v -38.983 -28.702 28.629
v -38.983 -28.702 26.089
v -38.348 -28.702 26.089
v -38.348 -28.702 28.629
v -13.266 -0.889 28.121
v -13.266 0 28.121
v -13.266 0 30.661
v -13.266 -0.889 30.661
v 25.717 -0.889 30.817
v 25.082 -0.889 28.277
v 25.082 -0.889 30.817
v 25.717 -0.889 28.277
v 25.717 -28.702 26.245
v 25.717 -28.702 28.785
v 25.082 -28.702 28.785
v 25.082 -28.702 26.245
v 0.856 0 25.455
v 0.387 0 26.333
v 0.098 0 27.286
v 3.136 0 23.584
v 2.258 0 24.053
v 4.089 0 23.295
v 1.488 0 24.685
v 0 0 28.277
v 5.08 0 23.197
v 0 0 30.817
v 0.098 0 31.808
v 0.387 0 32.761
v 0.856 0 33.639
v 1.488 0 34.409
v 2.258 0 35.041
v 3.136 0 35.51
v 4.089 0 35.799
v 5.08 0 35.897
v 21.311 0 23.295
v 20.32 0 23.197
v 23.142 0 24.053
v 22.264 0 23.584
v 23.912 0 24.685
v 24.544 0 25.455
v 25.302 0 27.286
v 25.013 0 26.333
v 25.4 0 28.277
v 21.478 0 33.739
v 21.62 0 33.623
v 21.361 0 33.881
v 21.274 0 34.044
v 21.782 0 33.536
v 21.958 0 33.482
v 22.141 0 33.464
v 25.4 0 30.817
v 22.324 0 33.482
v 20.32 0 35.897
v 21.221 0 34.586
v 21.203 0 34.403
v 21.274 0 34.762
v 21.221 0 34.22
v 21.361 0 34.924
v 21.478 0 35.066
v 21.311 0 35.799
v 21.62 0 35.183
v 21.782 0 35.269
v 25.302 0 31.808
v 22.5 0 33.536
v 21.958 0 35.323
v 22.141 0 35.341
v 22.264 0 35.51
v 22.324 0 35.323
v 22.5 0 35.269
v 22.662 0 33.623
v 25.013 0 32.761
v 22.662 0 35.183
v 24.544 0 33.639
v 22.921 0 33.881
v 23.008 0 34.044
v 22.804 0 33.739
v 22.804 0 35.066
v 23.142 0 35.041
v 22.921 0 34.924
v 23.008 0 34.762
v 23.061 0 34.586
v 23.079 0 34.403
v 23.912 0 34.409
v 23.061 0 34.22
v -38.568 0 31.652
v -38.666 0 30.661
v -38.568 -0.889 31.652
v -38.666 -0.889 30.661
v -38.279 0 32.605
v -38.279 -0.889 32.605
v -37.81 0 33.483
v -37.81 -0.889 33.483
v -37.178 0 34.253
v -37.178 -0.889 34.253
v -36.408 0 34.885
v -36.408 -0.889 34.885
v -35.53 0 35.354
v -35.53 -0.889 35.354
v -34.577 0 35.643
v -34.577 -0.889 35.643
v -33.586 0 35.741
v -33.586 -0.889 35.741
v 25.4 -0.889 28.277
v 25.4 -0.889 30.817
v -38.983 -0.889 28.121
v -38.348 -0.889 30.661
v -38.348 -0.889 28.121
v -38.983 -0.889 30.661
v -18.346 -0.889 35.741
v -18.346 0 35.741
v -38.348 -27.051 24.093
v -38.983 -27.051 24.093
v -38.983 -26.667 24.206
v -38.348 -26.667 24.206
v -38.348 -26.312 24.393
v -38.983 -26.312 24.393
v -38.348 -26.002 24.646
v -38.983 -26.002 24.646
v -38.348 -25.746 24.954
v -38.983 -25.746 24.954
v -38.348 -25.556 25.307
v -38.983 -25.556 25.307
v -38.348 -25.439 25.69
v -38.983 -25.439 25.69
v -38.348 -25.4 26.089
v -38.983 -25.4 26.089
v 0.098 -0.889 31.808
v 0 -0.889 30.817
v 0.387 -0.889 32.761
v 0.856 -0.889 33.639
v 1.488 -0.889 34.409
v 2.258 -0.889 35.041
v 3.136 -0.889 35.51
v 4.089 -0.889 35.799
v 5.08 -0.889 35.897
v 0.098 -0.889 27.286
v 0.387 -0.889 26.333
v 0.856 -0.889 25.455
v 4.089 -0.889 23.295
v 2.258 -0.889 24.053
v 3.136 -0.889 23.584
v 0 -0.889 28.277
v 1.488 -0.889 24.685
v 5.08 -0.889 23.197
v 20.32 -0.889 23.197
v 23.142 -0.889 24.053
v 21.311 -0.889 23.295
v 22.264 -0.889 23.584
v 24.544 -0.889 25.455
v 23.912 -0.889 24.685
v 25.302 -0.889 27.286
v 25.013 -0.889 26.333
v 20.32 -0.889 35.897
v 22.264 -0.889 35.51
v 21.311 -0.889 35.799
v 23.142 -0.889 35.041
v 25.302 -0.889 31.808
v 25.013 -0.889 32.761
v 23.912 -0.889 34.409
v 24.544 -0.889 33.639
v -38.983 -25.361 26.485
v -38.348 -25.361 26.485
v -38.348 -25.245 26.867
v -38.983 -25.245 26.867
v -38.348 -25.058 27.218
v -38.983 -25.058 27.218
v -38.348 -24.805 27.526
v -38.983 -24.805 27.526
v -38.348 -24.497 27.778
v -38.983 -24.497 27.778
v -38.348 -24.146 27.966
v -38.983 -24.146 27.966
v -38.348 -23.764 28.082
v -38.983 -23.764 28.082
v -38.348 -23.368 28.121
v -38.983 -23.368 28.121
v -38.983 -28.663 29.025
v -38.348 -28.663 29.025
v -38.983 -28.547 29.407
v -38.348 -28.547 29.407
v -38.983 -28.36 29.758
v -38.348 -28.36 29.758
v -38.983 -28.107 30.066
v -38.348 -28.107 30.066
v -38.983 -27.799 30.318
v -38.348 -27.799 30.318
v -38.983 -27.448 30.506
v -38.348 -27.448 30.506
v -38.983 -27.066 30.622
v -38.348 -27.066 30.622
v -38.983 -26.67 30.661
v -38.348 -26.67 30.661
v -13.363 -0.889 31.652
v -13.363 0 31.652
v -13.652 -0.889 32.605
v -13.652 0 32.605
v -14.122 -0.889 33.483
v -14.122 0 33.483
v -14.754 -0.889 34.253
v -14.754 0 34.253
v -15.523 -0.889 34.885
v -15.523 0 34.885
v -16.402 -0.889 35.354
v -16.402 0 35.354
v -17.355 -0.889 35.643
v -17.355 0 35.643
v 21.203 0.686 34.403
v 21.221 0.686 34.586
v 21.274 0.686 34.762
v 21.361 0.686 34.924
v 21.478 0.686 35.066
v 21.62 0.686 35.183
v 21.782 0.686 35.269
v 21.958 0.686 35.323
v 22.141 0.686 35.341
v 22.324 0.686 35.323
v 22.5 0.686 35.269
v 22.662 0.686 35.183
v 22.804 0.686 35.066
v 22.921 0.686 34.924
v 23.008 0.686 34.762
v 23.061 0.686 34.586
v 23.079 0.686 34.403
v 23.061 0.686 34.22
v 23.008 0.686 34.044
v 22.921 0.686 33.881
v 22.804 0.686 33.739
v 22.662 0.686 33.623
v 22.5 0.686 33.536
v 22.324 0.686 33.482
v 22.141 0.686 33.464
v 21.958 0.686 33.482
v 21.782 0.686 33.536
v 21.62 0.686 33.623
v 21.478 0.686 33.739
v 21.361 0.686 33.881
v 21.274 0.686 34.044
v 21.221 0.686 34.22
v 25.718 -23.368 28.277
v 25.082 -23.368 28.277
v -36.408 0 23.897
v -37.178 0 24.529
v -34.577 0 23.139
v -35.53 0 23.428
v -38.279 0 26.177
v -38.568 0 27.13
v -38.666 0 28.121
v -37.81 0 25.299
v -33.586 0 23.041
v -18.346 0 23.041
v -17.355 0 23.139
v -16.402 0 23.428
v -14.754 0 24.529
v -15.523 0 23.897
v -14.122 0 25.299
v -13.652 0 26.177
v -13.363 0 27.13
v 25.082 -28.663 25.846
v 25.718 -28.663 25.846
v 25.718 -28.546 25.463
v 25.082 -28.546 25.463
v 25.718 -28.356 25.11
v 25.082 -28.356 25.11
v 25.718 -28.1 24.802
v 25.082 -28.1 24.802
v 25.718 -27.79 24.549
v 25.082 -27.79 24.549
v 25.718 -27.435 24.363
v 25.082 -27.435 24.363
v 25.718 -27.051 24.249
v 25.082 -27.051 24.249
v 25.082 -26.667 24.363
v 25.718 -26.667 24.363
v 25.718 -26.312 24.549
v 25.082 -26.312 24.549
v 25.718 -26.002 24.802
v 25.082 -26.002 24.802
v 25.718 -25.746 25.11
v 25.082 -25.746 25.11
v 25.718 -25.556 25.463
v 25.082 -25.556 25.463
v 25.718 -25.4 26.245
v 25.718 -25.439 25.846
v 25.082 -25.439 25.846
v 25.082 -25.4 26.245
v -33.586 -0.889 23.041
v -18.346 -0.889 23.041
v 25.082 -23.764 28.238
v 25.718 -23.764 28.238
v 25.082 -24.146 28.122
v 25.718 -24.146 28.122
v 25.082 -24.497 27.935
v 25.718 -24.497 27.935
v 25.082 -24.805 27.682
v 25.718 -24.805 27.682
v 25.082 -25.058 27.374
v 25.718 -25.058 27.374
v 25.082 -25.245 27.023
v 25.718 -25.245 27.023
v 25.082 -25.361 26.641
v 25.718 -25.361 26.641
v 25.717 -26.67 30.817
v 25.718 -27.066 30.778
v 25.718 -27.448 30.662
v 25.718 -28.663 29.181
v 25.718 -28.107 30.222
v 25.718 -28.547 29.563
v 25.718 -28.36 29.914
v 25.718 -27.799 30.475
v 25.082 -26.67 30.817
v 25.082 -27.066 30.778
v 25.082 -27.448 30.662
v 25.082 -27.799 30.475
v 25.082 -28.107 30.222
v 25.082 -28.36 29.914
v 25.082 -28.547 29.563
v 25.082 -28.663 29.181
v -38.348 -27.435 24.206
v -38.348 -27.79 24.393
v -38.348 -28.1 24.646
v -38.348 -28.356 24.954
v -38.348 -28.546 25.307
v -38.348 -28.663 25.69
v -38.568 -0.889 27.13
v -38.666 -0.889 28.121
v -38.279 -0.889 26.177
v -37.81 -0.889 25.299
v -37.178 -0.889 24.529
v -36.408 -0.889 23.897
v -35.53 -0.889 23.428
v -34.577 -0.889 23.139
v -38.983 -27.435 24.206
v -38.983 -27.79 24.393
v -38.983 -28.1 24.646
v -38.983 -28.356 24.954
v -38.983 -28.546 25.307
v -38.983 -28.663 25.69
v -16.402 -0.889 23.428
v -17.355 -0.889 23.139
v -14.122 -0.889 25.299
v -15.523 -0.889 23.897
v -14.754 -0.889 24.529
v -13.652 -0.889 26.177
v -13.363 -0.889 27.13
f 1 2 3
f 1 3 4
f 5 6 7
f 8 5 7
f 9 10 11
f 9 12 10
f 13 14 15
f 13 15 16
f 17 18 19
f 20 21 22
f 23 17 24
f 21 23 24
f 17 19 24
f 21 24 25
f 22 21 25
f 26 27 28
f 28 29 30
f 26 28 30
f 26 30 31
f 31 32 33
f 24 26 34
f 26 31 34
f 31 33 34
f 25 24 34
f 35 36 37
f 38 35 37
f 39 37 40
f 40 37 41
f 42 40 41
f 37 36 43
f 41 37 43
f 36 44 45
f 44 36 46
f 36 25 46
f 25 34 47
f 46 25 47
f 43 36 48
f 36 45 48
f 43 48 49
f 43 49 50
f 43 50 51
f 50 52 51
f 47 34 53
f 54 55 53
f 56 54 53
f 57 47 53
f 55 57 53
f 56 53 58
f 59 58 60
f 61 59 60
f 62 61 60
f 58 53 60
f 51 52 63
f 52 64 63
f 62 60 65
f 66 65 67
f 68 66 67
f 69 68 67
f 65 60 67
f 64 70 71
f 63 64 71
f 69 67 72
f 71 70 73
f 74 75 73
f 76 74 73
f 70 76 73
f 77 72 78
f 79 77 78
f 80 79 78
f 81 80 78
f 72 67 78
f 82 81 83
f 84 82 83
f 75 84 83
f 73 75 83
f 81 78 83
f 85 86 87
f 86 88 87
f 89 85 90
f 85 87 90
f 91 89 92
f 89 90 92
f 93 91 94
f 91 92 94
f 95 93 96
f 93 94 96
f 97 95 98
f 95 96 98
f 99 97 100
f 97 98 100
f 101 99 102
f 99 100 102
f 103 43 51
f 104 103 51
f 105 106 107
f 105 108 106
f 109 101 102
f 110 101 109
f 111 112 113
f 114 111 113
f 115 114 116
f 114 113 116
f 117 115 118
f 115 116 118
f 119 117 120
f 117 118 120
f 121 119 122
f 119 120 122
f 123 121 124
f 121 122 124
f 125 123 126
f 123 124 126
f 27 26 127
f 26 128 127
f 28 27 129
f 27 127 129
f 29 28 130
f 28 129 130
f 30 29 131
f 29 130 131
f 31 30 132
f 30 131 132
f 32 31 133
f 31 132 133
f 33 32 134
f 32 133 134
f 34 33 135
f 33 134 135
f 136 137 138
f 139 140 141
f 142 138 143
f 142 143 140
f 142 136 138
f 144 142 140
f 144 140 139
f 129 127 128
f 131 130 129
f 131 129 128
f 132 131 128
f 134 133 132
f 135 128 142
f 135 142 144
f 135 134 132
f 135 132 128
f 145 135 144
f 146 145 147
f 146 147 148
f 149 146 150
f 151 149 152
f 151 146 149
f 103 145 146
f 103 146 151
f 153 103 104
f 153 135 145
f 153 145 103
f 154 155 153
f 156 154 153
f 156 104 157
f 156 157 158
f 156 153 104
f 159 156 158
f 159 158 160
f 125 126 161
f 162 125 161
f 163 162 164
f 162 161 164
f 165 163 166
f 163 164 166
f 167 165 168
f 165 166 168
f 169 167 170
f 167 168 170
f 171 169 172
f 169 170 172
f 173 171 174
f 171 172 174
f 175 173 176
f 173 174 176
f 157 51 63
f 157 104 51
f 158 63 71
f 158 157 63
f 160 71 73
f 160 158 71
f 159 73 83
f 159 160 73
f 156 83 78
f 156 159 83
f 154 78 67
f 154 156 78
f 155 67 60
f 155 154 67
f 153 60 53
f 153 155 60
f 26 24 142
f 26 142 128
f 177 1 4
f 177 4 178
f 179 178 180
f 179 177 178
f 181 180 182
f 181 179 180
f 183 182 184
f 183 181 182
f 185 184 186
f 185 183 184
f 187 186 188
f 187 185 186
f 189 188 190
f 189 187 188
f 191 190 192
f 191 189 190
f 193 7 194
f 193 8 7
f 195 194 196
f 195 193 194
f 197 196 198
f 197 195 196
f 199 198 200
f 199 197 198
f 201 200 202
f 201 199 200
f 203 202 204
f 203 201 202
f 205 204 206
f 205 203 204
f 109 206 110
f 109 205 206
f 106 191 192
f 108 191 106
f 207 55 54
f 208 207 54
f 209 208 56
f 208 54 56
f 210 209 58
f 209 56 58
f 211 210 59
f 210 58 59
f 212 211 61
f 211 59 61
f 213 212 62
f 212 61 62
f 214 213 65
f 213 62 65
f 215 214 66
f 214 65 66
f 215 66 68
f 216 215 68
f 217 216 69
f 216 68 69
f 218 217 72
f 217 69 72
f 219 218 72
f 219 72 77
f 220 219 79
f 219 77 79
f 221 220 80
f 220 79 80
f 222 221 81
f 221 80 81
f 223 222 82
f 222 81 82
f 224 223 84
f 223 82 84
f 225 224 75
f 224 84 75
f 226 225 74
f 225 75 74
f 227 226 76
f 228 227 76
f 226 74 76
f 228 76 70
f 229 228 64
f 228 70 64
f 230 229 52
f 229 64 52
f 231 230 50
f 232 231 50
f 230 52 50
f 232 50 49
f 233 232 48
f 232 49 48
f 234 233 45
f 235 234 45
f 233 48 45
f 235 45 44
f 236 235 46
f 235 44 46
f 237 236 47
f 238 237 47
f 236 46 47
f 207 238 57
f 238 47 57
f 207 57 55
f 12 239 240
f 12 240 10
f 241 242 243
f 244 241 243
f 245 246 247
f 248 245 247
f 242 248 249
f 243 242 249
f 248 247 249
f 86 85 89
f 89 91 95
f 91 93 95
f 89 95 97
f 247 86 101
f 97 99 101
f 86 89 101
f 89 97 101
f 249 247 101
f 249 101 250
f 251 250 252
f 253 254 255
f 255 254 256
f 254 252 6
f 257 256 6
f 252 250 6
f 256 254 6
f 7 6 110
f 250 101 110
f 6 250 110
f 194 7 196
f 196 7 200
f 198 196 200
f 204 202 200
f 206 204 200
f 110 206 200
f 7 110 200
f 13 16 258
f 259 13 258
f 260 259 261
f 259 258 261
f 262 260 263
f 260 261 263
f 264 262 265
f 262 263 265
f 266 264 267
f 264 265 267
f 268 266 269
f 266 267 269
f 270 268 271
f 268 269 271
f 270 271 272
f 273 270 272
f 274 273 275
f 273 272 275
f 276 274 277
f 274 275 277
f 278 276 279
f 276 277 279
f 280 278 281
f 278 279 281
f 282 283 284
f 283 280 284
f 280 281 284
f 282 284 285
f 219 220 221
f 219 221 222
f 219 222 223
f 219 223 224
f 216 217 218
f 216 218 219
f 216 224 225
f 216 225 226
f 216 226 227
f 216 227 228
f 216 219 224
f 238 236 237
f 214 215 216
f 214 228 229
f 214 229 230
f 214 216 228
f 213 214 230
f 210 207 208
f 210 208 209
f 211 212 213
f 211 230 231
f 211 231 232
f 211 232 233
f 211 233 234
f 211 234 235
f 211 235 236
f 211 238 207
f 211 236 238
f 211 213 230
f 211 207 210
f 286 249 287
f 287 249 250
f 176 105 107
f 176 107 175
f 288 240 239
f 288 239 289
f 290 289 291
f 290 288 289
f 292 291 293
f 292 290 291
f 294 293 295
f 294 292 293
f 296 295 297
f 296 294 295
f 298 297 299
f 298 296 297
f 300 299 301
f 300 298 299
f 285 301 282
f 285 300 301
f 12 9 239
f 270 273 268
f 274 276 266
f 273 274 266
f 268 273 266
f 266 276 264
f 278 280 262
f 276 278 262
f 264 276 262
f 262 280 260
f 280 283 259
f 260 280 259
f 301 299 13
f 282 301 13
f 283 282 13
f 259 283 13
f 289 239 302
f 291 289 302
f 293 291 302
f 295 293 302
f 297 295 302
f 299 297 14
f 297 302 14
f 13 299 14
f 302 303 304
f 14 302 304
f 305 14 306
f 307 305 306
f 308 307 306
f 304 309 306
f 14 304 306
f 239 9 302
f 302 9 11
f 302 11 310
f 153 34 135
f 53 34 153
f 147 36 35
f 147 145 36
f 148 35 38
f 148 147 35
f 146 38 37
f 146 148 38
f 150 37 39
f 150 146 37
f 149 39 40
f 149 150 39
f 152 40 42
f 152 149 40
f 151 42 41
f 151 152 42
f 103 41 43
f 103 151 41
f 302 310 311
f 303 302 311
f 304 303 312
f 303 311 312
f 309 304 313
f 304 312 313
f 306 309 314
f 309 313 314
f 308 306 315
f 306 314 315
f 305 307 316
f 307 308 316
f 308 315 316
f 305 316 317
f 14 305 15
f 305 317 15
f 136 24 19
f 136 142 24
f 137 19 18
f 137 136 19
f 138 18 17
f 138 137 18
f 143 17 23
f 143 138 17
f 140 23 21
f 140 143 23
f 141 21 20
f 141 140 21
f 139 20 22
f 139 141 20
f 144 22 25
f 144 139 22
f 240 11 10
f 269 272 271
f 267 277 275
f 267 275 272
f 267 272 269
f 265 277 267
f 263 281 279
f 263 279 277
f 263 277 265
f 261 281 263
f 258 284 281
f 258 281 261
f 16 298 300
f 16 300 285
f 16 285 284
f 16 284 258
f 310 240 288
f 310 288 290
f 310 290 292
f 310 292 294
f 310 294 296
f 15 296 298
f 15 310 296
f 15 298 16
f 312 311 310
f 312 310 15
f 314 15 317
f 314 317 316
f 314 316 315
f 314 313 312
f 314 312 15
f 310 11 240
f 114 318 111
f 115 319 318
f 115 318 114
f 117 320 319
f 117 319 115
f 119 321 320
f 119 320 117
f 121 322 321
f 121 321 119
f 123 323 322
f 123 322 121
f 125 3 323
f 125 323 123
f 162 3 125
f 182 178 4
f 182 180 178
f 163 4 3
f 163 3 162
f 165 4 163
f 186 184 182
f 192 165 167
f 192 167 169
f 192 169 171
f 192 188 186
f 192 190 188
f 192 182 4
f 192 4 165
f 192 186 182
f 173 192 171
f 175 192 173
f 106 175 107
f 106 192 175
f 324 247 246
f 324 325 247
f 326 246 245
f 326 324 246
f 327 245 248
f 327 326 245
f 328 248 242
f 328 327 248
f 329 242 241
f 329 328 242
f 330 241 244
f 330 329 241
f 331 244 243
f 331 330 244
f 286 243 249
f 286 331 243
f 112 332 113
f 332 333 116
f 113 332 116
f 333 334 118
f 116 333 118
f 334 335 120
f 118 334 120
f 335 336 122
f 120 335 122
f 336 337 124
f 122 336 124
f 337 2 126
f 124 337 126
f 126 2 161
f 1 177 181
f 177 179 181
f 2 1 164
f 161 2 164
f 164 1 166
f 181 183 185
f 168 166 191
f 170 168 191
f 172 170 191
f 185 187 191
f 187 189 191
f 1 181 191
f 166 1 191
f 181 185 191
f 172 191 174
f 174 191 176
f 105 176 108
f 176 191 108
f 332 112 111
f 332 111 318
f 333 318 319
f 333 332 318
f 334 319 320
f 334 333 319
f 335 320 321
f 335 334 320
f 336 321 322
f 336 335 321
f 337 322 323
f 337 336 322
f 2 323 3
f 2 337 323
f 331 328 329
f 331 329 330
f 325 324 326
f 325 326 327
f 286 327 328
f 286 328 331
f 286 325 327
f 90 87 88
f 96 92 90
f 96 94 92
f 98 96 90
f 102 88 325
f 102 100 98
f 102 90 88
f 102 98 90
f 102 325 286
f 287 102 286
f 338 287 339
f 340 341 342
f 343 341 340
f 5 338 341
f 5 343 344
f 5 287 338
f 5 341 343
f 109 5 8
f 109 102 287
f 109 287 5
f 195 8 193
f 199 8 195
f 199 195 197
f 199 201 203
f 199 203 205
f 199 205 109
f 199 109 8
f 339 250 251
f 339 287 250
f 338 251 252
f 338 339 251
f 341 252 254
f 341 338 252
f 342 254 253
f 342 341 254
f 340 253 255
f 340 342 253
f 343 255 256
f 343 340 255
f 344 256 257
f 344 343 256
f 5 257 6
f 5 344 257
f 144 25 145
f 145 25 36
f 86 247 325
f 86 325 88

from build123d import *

# Parameters (mm, degrees)
F0_W        = 25.4
F0_H        = 12.7
F1_DEPTH    = 0.889
F2_R        = 5.08
F2_2_R      = 5.08
F5_DEPTH    = 0.3175
F6_T1_DEPTH = 0.635
F6_T3_DEPTH = 10.795
F8_DEPTH    = 0.3175
F9_T1_DEPTH = 0.635
F9_T3_DEPTH = 10.795
F10_R       = 0.9381315748
F10_R_2     = 0.643552657
F10_R_3     = 0.4022191612
F11_DEPTH   = 0.6858


# Not quite as in the source:
# - a fillet or chamfer that OpenCascade refuses, or shapes differently, is made with other operations: its cross-section is extruded or revolved along the edge and cut away or added
# - a feature names something its author has since deleted; it is built from what else it names
# - the program builds the solid bodies; features that only make, move or delete a surface that nothing else refers to are left out


with BuildPart() as f1:
    # F0 (on Front) → F1 (new body)
    with BuildSketch(Plane.XZ):
        with Locations((-25.9656485498, 29.3908948079)):
            Rectangle(F0_W, F0_H)
    extrude(amount=F1_DEPTH)

    # F2
    f2_edges = [f1.edges().sort_by_distance(p)[0] for p in [
        (-38.665649, -0.4445, 35.740895),
        (-38.665649, -0.4445, 23.040895),
        (-13.265649, -0.4445, 23.040895),
        (-13.265649, -0.4445, 35.740895),
    ]]
    fillet(f2_edges, radius=F2_R)


with BuildPart() as f1b:
    # F0 (on Front) → F1, piece 2 (new body)
    with BuildSketch(Plane.XZ):
        with Locations((12.7, 29.546997121)):
            Rectangle(F0_W, F0_H)
    extrude(amount=F1_DEPTH)

    # F2#2
    f2_2_edges = [f1b.edges().sort_by_distance(p)[0] for p in [
        (0, -0.4445, 35.896997),
        (0, -0.4445, 23.196997),
        (25.4, -0.4445, 23.196997),
        (25.4, -0.4445, 35.896997),
    ]]
    fillet(f2_2_edges, radius=F2_2_R)

    # F10 (on face) → F11 (join)
    with BuildSketch(Plane(origin=(0, 0, 0), x_dir=(-1, 0, 0), z_dir=(0, 1, 0))):
        with Locations((-22.1409089863, 34.4025939703)):
            Circle(F10_R)
        with Locations((-22.1409089863, 34.4025939703)):
            Circle(F10_R_2, mode=Mode.SUBTRACT)
        with Locations((-22.1409089863, 34.4025939703)):
            Circle(F10_R_2)
        with Locations((-22.1409089863, 34.4025939703)):
            Circle(F10_R_3, mode=Mode.SUBTRACT)
        with Locations((-22.1409089863, 34.4025939703)):
            Circle(F10_R_3)
    extrude(amount=F11_DEPTH)


with BuildPart() as f5:
    # F4 (on face) → F5 (new body, symmetric)
    with BuildSketch(Plane.YZ.offset(25.4)):
        Polygon((-0.889, 28.276997121), (-0.889, 30.816997121), (-25.4, 30.816997121), (-28.702, 30.816997121), (-28.702, 24.212997121), (-25.4, 24.212997121), (-25.4, 28.276997121), align=None)
    extrude(amount=F5_DEPTH, both=True)

    # F6: fillet of radius 2.032 on 4 edges, made by hand

    # F6_s2 → F6_t1 (join)
    with BuildSketch(Plane.YZ.offset(25.0825)):
        with BuildLine():
            ThreePointArc((-23.368, 28.276997121), (-24.8048409794, 27.6818381003), (-25.4, 26.244997121))
            Line((-25.4, 26.244997121), (-25.4, 28.276997121))
            Line((-25.4, 28.276997121), (-23.368, 28.276997121))
        make_face()
    extrude(amount=F6_T1_DEPTH)

    # F6_s4 → F6_t3 (cut)
    with BuildSketch(Plane.YZ.offset(20.0025)):
        with BuildLine():
            ThreePointArc((-26.67, 30.816997121), (-28.1068409794, 30.2218381003), (-28.702, 28.784997121))
            Line((-28.702, 28.784997121), (-28.702, 30.816997121))
            Line((-28.702, 30.816997121), (-26.67, 30.816997121))
        make_face()
        with BuildLine():
            ThreePointArc((-28.702, 26.244997121), (-28.1068409794, 24.8081561416), (-26.67, 24.212997121))
            Line((-26.67, 24.212997121), (-28.702, 24.212997121))
            Line((-28.702, 24.212997121), (-28.702, 26.244997121))
        make_face()
        with BuildLine():
            ThreePointArc((-27.432, 24.212997121), (-25.9951590206, 24.8081561416), (-25.4, 26.244997121))
            Line((-25.4, 26.244997121), (-25.4, 24.212997121))
            Line((-25.4, 24.212997121), (-27.432, 24.212997121))
        make_face()
    extrude(amount=F6_T3_DEPTH, mode=Mode.SUBTRACT)


with BuildPart() as f8:
    # F7 (on face) → F8 (new body, symmetric)
    with BuildSketch(Plane(origin=(-38.6656485498, 0, 0), x_dir=(0, -1, 0), z_dir=(-1, 0, 0))):
        Polygon((25.4, 30.6608948079), (0.889, 30.6608948079), (0.889, 28.1208948079), (25.4, 28.1208948079), (25.4, 24.0568948079), (28.702, 24.0568948079), (28.702, 30.6608948079), align=None)
    extrude(amount=F8_DEPTH, both=True)

    # F9: fillet of radius 2.032 on 4 edges, made by hand

    # F9_s2 → F9_t1 (join)
    with BuildSketch(Plane.YZ.offset(-38.9831485498)):
        with BuildLine():
            ThreePointArc((-25.4, 26.0888948079), (-24.8048409794, 27.5257357872), (-23.368, 28.1208948079))
            Line((-23.368, 28.1208948079), (-25.4, 28.1208948079))
            Line((-25.4, 28.1208948079), (-25.4, 26.0888948079))
        make_face()
    extrude(amount=F9_T1_DEPTH)

    # F9_s4 → F9_t3 (cut)
    with BuildSketch(Plane.YZ.offset(-44.0631485498)):
        with BuildLine():
            ThreePointArc((-27.432, 24.0568948079), (-25.9951590206, 24.6520538285), (-25.4, 26.0888948079))
            Line((-25.4, 26.0888948079), (-25.4, 24.0568948079))
            Line((-25.4, 24.0568948079), (-27.432, 24.0568948079))
        make_face()
        with BuildLine():
            ThreePointArc((-26.67, 24.0568948079), (-28.1068409794, 24.6520538285), (-28.702, 26.0888948079))
            Line((-28.702, 26.0888948079), (-28.702, 24.0568948079))
            Line((-28.702, 24.0568948079), (-26.67, 24.0568948079))
        make_face()
        with BuildLine():
            ThreePointArc((-28.702, 28.6288948079), (-28.1068409794, 30.0657357872), (-26.67, 30.6608948079))
            Line((-26.67, 30.6608948079), (-28.702, 30.6608948079))
            Line((-28.702, 30.6608948079), (-28.702, 28.6288948079))
        make_face()
    extrude(amount=F9_T3_DEPTH, mode=Mode.SUBTRACT)


solid = Compound([f1.part, f1b.part, f5.part, f8.part])
